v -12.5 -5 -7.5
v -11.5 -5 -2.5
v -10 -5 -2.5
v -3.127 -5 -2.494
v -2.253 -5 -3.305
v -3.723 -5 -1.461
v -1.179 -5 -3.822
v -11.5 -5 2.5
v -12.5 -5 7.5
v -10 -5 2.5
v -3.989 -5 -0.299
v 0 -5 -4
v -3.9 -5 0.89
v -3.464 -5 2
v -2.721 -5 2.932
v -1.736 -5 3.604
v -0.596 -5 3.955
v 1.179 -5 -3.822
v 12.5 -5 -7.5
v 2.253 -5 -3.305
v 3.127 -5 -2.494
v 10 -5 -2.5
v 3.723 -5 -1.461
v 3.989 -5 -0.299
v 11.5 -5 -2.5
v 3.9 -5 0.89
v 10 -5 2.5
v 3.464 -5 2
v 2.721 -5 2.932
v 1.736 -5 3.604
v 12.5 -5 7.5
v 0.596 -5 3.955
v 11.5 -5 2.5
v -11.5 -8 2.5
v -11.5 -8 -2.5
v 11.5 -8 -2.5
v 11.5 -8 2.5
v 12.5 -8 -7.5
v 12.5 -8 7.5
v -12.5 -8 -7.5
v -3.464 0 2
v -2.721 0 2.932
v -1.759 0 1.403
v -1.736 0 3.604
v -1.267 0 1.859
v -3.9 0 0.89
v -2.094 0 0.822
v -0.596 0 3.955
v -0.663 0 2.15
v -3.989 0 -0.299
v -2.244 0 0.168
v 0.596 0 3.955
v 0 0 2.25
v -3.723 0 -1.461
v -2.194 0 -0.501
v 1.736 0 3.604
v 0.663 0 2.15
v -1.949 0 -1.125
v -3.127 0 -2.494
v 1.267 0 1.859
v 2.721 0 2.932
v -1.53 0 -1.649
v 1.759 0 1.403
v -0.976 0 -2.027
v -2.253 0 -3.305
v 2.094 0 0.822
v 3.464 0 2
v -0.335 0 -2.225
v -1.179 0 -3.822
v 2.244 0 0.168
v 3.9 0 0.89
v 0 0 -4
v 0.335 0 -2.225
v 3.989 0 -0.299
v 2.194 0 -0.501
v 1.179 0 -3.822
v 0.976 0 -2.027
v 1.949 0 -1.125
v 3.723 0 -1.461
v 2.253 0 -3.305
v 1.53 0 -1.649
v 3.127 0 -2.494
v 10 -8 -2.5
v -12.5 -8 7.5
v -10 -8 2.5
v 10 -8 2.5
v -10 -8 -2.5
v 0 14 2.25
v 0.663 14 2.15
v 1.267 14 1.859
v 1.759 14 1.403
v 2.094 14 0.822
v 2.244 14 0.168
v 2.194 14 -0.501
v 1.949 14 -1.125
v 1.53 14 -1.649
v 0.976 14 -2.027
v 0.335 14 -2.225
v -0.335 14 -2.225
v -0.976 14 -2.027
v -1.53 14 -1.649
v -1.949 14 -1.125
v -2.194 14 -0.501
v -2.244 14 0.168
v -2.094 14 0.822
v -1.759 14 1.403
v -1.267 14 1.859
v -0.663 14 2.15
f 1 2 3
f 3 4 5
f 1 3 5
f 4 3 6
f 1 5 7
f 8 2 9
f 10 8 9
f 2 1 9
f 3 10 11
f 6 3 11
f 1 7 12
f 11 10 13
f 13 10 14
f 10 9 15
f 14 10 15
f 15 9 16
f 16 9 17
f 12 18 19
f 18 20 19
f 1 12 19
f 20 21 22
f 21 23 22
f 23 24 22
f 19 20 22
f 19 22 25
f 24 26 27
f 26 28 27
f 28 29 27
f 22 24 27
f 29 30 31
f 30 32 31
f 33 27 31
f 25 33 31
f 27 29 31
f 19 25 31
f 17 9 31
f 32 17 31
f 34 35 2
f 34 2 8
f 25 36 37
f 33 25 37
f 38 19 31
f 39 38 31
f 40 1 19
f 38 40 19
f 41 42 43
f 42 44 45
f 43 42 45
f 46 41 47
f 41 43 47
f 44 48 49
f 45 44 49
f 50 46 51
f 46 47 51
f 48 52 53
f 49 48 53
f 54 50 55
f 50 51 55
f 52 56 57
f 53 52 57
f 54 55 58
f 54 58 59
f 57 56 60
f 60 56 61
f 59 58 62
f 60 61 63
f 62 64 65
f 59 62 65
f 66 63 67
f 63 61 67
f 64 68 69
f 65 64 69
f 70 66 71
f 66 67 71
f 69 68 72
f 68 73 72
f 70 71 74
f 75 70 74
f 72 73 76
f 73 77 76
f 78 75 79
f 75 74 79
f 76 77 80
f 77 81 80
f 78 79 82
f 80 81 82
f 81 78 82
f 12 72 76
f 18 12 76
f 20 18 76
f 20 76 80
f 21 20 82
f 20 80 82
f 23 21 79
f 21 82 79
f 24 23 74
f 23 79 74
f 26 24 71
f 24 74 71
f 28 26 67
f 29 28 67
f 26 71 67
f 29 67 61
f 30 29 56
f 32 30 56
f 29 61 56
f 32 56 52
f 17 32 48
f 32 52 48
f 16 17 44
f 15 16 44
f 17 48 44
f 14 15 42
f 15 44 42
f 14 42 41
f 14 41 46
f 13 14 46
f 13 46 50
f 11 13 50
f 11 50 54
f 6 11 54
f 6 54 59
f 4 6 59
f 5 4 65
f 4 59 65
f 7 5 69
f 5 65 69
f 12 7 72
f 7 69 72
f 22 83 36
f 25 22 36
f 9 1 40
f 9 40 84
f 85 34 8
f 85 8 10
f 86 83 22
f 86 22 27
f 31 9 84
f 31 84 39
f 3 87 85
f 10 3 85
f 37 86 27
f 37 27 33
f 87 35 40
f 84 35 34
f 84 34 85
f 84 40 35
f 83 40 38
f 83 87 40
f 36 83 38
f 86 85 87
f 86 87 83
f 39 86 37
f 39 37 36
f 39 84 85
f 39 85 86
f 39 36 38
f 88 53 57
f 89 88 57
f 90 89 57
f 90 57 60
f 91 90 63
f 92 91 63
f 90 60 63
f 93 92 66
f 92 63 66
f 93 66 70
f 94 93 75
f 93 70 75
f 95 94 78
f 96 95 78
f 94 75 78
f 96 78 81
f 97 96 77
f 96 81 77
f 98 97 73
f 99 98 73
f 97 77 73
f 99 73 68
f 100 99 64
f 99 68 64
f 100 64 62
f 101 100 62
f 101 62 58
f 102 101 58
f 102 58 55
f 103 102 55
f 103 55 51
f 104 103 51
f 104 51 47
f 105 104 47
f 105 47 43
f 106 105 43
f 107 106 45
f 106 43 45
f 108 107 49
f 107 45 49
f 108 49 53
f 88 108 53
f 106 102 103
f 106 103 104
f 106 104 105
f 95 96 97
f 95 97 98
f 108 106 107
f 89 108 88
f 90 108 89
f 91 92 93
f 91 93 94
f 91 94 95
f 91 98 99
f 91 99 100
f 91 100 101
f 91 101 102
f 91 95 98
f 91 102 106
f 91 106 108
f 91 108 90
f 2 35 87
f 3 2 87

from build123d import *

# Parameters (mm, degrees)
SKETCH1_R           = 2.25
BOSS_EXTRUDE1_DEPTH = 14
SKETCH2_R           = 4
BOSS_EXTRUDE2_DEPTH = 5
SKETCH3_W           = 25
SKETCH3_H           = 15
BOSS_EXTRUDE3_DEPTH = 3
SKETCH4_W           = 1.5
SKETCH4_H           = 5
CUT_EXTRUDE1_DEPTH  = 3


with BuildPart() as part:
    # Sketch1 → Boss-Extrude1 (new body)
    with BuildSketch(Plane(origin=(0, 0, 0), x_dir=(1, 0, 0), z_dir=(0, 1, 0))):
        with Locations(Location((0, 0, 0), (0, 0, 270))):
            Circle(SKETCH1_R)
    extrude(amount=BOSS_EXTRUDE1_DEPTH)

    # Sketch2 → Boss-Extrude2 (add)
    with BuildSketch(Plane.XZ):
        with Locations(Location((0, 0, 0), (0, 0, 270))):
            Circle(SKETCH2_R)
    extrude(amount=BOSS_EXTRUDE2_DEPTH)

    # Sketch3 → Boss-Extrude3 (add)
    with BuildSketch(Plane.XZ.offset(5)):
        Rectangle(SKETCH3_W, SKETCH3_H)
    extrude(amount=BOSS_EXTRUDE3_DEPTH)

    # Sketch4 → Cut-Extrude1 (cut)
    with BuildSketch(Plane.XZ.offset(8)):
        with Locations((-10.75, 0)):
            Rectangle(SKETCH4_W, SKETCH4_H)
        with Locations((10.75, 0)):
            Rectangle(SKETCH4_W, SKETCH4_H)
    extrude(amount=-CUT_EXTRUDE1_DEPTH, mode=Mode.SUBTRACT)


solid = part.part
